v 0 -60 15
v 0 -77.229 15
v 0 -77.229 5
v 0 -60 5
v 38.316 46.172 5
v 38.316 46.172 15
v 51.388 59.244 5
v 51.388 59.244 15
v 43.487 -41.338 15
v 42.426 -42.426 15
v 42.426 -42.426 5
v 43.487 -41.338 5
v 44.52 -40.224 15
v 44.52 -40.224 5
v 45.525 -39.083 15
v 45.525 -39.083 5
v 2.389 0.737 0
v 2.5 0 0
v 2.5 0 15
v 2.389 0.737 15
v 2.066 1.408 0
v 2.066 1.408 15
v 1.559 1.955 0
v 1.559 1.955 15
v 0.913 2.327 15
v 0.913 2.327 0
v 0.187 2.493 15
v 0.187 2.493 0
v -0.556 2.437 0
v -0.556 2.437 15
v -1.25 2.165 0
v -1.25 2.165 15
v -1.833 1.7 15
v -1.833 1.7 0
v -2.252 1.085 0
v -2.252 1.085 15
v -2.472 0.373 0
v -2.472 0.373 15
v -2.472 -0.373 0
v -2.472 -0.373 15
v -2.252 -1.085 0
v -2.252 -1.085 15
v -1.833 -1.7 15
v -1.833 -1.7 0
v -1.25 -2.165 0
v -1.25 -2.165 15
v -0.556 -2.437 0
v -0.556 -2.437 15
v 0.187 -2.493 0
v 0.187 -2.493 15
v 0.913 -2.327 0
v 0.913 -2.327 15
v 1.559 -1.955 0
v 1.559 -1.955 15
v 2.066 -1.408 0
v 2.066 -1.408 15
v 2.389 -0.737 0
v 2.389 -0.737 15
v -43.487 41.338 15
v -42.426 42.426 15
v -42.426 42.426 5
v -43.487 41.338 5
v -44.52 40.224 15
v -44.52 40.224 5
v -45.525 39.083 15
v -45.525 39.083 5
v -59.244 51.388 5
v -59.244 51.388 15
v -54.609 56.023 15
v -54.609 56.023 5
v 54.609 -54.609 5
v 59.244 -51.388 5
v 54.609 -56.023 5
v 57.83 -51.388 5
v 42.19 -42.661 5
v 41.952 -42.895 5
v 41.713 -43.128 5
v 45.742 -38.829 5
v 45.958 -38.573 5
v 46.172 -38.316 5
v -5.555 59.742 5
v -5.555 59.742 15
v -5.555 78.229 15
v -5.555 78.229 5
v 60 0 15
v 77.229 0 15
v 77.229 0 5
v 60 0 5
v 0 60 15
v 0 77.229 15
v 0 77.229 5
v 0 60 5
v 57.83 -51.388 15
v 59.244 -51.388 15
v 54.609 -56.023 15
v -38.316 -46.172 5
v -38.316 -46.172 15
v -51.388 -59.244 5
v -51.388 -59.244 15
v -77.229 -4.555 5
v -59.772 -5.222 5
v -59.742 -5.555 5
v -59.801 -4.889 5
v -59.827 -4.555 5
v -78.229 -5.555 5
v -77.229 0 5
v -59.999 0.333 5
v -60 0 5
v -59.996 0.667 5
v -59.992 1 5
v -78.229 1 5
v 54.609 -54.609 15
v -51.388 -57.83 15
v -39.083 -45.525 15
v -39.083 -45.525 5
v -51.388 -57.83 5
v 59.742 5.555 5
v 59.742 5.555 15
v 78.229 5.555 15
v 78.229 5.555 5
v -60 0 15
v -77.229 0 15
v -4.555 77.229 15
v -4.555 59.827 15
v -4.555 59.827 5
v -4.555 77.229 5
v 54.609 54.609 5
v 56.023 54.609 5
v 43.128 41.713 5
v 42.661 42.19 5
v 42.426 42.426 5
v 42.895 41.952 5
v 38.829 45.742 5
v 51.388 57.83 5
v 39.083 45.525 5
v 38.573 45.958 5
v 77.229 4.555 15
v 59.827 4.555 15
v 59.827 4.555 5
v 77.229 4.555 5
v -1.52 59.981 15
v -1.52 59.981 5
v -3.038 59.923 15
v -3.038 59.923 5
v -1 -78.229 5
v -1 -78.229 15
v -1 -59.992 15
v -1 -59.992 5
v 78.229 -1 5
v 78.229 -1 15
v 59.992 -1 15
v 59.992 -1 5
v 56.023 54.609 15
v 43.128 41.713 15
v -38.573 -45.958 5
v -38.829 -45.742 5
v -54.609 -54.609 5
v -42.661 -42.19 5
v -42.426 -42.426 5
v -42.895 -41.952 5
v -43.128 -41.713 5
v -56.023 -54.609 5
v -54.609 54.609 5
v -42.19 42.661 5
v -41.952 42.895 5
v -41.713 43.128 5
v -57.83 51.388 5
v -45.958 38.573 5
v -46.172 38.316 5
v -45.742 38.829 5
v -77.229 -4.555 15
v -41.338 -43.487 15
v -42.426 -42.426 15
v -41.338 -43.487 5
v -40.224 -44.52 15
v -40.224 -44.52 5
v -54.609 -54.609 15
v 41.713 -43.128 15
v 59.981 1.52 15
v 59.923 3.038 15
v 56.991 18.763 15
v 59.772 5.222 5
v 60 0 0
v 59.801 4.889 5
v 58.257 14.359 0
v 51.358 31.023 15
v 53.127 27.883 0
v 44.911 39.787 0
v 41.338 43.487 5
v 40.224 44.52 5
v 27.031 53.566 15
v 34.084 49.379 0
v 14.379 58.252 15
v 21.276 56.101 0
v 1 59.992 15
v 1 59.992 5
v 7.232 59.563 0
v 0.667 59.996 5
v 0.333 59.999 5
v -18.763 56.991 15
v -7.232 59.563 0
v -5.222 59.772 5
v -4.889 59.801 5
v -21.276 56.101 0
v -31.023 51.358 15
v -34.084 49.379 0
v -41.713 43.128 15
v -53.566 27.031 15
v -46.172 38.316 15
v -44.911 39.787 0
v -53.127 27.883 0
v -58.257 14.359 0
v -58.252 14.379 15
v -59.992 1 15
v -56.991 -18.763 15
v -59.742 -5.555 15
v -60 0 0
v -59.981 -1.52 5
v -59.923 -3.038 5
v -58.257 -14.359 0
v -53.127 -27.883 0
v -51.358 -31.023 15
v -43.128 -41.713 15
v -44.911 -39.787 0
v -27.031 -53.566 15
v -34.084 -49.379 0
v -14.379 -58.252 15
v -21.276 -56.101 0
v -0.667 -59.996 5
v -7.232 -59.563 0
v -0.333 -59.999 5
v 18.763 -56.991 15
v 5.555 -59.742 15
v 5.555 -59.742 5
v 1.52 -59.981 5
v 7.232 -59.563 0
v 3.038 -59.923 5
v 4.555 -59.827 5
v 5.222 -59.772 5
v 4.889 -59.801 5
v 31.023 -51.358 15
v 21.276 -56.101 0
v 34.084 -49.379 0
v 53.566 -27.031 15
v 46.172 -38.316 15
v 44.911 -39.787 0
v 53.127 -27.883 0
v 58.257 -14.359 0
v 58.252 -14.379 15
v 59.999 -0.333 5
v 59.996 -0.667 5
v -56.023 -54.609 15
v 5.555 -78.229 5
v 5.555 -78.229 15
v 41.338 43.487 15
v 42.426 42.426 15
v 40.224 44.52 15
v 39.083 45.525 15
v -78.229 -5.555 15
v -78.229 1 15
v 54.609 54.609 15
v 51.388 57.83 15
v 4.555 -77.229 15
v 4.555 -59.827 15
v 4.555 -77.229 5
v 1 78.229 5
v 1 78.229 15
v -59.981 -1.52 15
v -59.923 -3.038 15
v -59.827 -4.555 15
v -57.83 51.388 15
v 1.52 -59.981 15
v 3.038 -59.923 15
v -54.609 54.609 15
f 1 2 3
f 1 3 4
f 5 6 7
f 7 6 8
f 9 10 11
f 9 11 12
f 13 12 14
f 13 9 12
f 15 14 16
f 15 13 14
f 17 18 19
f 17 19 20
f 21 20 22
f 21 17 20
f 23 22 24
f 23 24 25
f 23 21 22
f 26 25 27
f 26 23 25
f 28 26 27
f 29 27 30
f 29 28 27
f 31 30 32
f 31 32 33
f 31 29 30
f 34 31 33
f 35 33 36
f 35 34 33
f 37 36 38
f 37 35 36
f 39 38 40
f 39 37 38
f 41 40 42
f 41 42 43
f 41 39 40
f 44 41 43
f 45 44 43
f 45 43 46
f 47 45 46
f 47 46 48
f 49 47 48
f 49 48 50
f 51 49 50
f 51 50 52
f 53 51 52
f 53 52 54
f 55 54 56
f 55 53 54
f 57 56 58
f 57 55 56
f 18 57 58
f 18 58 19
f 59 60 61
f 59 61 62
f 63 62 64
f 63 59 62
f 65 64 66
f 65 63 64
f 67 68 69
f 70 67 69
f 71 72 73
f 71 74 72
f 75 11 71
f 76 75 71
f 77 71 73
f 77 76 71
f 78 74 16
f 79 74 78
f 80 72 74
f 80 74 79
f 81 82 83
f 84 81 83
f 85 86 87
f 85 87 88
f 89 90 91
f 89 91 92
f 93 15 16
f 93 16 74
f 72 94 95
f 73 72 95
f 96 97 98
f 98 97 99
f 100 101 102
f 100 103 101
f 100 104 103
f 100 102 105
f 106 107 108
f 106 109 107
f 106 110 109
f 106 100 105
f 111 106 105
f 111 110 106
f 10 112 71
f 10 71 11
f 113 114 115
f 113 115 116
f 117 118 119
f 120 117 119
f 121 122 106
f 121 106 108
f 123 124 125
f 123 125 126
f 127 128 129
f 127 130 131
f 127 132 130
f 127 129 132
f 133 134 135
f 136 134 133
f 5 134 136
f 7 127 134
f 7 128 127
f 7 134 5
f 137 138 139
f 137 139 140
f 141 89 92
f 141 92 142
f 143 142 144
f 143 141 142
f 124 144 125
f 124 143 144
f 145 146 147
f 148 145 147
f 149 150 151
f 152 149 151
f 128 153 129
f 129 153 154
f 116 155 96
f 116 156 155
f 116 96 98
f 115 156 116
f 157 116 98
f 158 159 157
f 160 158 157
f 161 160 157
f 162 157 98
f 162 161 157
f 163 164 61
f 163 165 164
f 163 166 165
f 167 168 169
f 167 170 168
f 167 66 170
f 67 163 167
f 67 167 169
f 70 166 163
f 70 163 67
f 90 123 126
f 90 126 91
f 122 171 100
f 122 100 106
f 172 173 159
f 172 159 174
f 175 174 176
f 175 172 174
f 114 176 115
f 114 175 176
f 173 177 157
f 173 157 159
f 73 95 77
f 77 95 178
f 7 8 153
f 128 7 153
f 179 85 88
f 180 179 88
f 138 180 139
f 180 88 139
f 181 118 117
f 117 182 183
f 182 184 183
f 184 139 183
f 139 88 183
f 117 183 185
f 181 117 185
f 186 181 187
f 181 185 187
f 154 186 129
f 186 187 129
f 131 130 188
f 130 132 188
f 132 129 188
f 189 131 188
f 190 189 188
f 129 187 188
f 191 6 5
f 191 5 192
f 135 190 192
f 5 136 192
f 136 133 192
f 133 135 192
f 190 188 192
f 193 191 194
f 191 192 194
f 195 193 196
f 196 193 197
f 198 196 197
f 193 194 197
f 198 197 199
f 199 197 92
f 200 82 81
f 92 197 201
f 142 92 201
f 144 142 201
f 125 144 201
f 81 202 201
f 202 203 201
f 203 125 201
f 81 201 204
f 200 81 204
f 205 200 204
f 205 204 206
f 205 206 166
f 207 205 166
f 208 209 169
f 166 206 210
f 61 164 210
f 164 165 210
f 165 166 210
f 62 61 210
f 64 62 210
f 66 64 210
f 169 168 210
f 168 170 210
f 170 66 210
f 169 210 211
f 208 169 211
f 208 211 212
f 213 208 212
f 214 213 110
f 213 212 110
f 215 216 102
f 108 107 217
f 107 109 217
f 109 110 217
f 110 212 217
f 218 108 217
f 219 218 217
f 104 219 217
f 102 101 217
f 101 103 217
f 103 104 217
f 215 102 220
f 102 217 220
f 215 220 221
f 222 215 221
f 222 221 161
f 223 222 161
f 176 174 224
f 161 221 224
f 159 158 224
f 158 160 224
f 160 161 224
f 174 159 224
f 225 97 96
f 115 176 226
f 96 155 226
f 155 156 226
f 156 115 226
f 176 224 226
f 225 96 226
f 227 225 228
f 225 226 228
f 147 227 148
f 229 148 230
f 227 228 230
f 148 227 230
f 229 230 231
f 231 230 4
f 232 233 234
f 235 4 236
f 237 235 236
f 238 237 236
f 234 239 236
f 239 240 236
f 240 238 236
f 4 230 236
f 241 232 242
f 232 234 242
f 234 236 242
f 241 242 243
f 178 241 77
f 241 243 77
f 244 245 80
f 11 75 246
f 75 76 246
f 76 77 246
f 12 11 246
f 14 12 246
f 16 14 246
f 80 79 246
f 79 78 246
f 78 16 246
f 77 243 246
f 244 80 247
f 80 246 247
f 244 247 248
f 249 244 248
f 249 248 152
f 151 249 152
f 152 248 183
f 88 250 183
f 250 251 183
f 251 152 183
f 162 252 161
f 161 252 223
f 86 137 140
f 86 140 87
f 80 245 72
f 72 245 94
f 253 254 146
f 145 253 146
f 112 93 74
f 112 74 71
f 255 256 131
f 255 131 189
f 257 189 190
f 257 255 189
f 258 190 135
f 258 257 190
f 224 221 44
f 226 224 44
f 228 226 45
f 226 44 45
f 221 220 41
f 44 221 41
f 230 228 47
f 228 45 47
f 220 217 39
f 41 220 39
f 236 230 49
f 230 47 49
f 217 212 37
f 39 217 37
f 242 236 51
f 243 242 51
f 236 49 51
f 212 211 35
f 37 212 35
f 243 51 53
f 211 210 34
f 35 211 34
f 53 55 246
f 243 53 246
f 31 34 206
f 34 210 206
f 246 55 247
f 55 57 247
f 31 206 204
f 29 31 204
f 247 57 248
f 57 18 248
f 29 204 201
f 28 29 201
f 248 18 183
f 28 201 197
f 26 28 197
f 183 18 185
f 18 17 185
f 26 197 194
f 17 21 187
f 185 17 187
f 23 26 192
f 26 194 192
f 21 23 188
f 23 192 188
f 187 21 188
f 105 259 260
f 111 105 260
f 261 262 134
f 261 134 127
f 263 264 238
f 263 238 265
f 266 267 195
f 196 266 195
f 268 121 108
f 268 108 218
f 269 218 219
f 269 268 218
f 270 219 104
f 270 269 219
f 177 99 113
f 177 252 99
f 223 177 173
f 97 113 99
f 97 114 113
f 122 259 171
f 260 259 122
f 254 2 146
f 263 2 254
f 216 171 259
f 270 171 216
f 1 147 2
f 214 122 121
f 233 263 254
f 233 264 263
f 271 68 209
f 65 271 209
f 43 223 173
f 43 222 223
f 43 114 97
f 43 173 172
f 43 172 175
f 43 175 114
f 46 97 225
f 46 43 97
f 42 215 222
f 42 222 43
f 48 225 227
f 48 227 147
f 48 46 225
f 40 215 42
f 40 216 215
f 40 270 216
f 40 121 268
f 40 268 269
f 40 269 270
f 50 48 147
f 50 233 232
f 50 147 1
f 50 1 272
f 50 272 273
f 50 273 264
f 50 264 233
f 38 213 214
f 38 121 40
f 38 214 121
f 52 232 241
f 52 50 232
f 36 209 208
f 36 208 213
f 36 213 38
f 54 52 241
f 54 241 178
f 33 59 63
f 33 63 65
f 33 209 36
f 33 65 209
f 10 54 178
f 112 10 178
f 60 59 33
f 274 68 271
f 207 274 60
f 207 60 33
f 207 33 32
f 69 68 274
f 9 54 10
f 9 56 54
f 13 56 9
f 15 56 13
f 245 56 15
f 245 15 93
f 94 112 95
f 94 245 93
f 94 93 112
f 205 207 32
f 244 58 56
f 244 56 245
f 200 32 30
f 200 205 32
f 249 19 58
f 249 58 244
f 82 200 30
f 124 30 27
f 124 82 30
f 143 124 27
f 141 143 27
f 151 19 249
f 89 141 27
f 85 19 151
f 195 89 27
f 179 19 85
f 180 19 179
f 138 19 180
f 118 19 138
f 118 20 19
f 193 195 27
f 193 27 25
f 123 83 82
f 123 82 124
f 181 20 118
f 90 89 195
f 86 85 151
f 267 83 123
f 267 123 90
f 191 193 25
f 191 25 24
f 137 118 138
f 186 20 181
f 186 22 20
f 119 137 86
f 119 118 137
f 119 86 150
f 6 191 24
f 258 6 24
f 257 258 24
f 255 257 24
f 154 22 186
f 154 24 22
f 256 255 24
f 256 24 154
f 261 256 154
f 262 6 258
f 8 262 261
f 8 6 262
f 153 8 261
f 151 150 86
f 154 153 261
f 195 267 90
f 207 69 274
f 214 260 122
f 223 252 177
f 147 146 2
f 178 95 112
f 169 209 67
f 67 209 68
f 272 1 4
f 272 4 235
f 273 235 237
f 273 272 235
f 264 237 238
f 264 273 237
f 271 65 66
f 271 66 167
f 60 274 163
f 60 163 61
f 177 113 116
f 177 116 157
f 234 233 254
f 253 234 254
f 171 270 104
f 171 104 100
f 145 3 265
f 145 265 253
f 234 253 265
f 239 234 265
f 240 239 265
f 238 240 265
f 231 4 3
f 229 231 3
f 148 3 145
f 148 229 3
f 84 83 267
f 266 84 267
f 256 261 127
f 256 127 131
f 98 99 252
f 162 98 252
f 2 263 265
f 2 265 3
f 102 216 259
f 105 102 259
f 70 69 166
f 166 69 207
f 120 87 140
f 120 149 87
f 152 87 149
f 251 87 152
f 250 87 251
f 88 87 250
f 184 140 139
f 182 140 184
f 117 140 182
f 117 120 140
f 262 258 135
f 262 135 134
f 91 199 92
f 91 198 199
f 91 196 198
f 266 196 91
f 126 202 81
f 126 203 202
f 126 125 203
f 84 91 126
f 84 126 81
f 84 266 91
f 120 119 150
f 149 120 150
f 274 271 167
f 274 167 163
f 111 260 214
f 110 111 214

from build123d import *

# Parameters (mm, degrees)
SKETCH1_R           = 60
SKETCH1_R_2         = 2.5
BOSS_EXTRUDE1_DEPTH = 15
EXTRUDE_THIN2_DEPTH = 10


with BuildPart() as part:
    # Sketch1 → Boss-Extrude1 (new body)
    with BuildSketch(Plane.XY):
        Circle(SKETCH1_R)
        Circle(SKETCH1_R_2, mode=Mode.SUBTRACT)
    extrude(amount=BOSS_EXTRUDE1_DEPTH)

    # Sketch3 → Extrude-Thin2 (add)
    with BuildSketch(Plane.XY.offset(15)):
        with BuildLine():
            Line((-5.555158991, 58.737894145), (-5.555158991, 78.229038529))
            Line((-5.555158991, 78.229038529), (1, 78.229038529))
            Line((1, 78.229038529), (1, 58.991524815))
            ThreePointArc((1, 58.991524815), (-2.281107294, 58.95588647), (-5.555158991, 58.737894145))
        make_face()
        with BuildLine():
            Line((-4.555158991, 59.826837845), (-4.555158991, 77.229038529))
            Line((-4.555158991, 77.229038529), (0, 77.229038529))
            Line((0, 77.229038529), (0, 60))
            ThreePointArc((0, 60), (-2.27922457, 59.956693833), (-4.555158991, 59.826837845))
        make_face(mode=Mode.SUBTRACT)
        with BuildLine():
            Line((37.60587267, 45.462053855), (51.388193036, 59.244374222))
            Line((51.388193036, 59.244374222), (56.023390411, 54.609176848))
            Line((56.023390411, 54.609176848), (42.42041401, 41.006200448))
            ThreePointArc((42.42041401, 41.006200448), (40.075120678, 43.30109355), (37.60587267, 45.462053855))
        make_face()
        with BuildLine():
            Line((39.082978926, 45.524946549), (51.388193036, 57.83016066))
            Line((51.388193036, 57.83016066), (54.609176848, 54.609176848))
            Line((54.609176848, 54.609176848), (42.426406871, 42.426406871))
            ThreePointArc((42.426406871, 42.426406871), (40.784129637, 44.007439936), (39.082978926, 45.524946549))
        make_face(mode=Mode.SUBTRACT)
        with BuildLine():
            Line((58.737894145, 5.555158991), (78.229038529, 5.555158991))
            Line((78.229038529, 5.555158991), (78.229038529, -1))
            Line((78.229038529, -1), (58.991524815, -1))
            ThreePointArc((58.991524815, -1), (58.95588647, 2.281107294), (58.737894145, 5.555158991))
        make_face()
        with BuildLine():
            Line((59.826837845, 4.555158991), (77.229038529, 4.555158991))
            Line((77.229038529, 4.555158991), (77.229038529, 0))
            Line((77.229038529, 0), (60, 0))
            ThreePointArc((60, 0), (59.956693833, 2.27922457), (59.826837845, 4.555158991))
        make_face(mode=Mode.SUBTRACT)
        with BuildLine():
            Line((45.462053855, -37.60587267), (59.244374222, -51.388193036))
            Line((59.244374222, -51.388193036), (54.609176848, -56.023390411))
            Line((54.609176848, -56.023390411), (41.006200448, -42.42041401))
            ThreePointArc((41.006200448, -42.42041401), (43.30109355, -40.075120678), (45.462053855, -37.60587267))
        make_face()
        with BuildLine():
            Line((45.524946549, -39.082978926), (57.83016066, -51.388193036))
            Line((57.83016066, -51.388193036), (54.609176848, -54.609176848))
            Line((54.609176848, -54.609176848), (42.426406871, -42.426406871))
            ThreePointArc((42.426406871, -42.426406871), (44.007439936, -40.784129637), (45.524946549, -39.082978926))
        make_face(mode=Mode.SUBTRACT)
        with BuildLine():
            Line((5.555158991, -58.737894145), (5.555158991, -78.229038529))
            Line((5.555158991, -78.229038529), (-1, -78.229038529))
            Line((-1, -78.229038529), (-1, -58.991524815))
            ThreePointArc((-1, -58.991524815), (2.281107294, -58.95588647), (5.555158991, -58.737894145))
        make_face()
        with BuildLine():
            Line((4.555158991, -59.826837845), (4.555158991, -77.229038529))
            Line((4.555158991, -77.229038529), (0, -77.229038529))
            Line((0, -77.229038529), (0, -60))
            ThreePointArc((0, -60), (2.27922457, -59.956693833), (4.555158991, -59.826837845))
        make_face(mode=Mode.SUBTRACT)
        with BuildLine():
            Line((-37.60587267, -45.462053855), (-51.388193036, -59.244374222))
            Line((-51.388193036, -59.244374222), (-56.023390411, -54.609176848))
            Line((-56.023390411, -54.609176848), (-42.42041401, -41.006200448))
            ThreePointArc((-42.42041401, -41.006200448), (-40.075120678, -43.30109355), (-37.60587267, -45.462053855))
        make_face()
        with BuildLine():
            Line((-39.082978926, -45.524946549), (-51.388193036, -57.83016066))
            Line((-51.388193036, -57.83016066), (-54.609176848, -54.609176848))
            Line((-54.609176848, -54.609176848), (-42.426406871, -42.426406871))
            ThreePointArc((-42.426406871, -42.426406871), (-40.784129637, -44.007439936), (-39.082978926, -45.524946549))
        make_face(mode=Mode.SUBTRACT)
        with BuildLine():
            Line((-58.737894145, -5.555158991), (-78.229038529, -5.555158991))
            Line((-78.229038529, -5.555158991), (-78.229038529, 1))
            Line((-78.229038529, 1), (-58.991524815, 1))
            ThreePointArc((-58.991524815, 1), (-58.95588647, -2.281107294), (-58.737894145, -5.555158991))
        make_face()
        with BuildLine():
            Line((-59.826837845, -4.555158991), (-77.229038529, -4.555158991))
            Line((-77.229038529, -4.555158991), (-77.229038529, 0))
            Line((-77.229038529, 0), (-60, 0))
            ThreePointArc((-60, 0), (-59.956693833, -2.27922457), (-59.826837845, -4.555158991))
        make_face(mode=Mode.SUBTRACT)
        with BuildLine():
            Line((-45.462053855, 37.60587267), (-59.244374222, 51.388193036))
            Line((-59.244374222, 51.388193036), (-54.609176848, 56.023390411))
            Line((-54.609176848, 56.023390411), (-41.006200448, 42.42041401))
            ThreePointArc((-41.006200448, 42.42041401), (-43.30109355, 40.075120678), (-45.462053855, 37.60587267))
        make_face()
        with BuildLine():
            Line((-45.524946549, 39.082978926), (-57.83016066, 51.388193036))
            Line((-57.83016066, 51.388193036), (-54.609176848, 54.609176848))
            Line((-54.609176848, 54.609176848), (-42.426406871, 42.426406871))
            ThreePointArc((-42.426406871, 42.426406871), (-44.007439936, 40.784129637), (-45.524946549, 39.082978926))
        make_face(mode=Mode.SUBTRACT)
    extrude(amount=-EXTRUDE_THIN2_DEPTH)


solid = part.part
